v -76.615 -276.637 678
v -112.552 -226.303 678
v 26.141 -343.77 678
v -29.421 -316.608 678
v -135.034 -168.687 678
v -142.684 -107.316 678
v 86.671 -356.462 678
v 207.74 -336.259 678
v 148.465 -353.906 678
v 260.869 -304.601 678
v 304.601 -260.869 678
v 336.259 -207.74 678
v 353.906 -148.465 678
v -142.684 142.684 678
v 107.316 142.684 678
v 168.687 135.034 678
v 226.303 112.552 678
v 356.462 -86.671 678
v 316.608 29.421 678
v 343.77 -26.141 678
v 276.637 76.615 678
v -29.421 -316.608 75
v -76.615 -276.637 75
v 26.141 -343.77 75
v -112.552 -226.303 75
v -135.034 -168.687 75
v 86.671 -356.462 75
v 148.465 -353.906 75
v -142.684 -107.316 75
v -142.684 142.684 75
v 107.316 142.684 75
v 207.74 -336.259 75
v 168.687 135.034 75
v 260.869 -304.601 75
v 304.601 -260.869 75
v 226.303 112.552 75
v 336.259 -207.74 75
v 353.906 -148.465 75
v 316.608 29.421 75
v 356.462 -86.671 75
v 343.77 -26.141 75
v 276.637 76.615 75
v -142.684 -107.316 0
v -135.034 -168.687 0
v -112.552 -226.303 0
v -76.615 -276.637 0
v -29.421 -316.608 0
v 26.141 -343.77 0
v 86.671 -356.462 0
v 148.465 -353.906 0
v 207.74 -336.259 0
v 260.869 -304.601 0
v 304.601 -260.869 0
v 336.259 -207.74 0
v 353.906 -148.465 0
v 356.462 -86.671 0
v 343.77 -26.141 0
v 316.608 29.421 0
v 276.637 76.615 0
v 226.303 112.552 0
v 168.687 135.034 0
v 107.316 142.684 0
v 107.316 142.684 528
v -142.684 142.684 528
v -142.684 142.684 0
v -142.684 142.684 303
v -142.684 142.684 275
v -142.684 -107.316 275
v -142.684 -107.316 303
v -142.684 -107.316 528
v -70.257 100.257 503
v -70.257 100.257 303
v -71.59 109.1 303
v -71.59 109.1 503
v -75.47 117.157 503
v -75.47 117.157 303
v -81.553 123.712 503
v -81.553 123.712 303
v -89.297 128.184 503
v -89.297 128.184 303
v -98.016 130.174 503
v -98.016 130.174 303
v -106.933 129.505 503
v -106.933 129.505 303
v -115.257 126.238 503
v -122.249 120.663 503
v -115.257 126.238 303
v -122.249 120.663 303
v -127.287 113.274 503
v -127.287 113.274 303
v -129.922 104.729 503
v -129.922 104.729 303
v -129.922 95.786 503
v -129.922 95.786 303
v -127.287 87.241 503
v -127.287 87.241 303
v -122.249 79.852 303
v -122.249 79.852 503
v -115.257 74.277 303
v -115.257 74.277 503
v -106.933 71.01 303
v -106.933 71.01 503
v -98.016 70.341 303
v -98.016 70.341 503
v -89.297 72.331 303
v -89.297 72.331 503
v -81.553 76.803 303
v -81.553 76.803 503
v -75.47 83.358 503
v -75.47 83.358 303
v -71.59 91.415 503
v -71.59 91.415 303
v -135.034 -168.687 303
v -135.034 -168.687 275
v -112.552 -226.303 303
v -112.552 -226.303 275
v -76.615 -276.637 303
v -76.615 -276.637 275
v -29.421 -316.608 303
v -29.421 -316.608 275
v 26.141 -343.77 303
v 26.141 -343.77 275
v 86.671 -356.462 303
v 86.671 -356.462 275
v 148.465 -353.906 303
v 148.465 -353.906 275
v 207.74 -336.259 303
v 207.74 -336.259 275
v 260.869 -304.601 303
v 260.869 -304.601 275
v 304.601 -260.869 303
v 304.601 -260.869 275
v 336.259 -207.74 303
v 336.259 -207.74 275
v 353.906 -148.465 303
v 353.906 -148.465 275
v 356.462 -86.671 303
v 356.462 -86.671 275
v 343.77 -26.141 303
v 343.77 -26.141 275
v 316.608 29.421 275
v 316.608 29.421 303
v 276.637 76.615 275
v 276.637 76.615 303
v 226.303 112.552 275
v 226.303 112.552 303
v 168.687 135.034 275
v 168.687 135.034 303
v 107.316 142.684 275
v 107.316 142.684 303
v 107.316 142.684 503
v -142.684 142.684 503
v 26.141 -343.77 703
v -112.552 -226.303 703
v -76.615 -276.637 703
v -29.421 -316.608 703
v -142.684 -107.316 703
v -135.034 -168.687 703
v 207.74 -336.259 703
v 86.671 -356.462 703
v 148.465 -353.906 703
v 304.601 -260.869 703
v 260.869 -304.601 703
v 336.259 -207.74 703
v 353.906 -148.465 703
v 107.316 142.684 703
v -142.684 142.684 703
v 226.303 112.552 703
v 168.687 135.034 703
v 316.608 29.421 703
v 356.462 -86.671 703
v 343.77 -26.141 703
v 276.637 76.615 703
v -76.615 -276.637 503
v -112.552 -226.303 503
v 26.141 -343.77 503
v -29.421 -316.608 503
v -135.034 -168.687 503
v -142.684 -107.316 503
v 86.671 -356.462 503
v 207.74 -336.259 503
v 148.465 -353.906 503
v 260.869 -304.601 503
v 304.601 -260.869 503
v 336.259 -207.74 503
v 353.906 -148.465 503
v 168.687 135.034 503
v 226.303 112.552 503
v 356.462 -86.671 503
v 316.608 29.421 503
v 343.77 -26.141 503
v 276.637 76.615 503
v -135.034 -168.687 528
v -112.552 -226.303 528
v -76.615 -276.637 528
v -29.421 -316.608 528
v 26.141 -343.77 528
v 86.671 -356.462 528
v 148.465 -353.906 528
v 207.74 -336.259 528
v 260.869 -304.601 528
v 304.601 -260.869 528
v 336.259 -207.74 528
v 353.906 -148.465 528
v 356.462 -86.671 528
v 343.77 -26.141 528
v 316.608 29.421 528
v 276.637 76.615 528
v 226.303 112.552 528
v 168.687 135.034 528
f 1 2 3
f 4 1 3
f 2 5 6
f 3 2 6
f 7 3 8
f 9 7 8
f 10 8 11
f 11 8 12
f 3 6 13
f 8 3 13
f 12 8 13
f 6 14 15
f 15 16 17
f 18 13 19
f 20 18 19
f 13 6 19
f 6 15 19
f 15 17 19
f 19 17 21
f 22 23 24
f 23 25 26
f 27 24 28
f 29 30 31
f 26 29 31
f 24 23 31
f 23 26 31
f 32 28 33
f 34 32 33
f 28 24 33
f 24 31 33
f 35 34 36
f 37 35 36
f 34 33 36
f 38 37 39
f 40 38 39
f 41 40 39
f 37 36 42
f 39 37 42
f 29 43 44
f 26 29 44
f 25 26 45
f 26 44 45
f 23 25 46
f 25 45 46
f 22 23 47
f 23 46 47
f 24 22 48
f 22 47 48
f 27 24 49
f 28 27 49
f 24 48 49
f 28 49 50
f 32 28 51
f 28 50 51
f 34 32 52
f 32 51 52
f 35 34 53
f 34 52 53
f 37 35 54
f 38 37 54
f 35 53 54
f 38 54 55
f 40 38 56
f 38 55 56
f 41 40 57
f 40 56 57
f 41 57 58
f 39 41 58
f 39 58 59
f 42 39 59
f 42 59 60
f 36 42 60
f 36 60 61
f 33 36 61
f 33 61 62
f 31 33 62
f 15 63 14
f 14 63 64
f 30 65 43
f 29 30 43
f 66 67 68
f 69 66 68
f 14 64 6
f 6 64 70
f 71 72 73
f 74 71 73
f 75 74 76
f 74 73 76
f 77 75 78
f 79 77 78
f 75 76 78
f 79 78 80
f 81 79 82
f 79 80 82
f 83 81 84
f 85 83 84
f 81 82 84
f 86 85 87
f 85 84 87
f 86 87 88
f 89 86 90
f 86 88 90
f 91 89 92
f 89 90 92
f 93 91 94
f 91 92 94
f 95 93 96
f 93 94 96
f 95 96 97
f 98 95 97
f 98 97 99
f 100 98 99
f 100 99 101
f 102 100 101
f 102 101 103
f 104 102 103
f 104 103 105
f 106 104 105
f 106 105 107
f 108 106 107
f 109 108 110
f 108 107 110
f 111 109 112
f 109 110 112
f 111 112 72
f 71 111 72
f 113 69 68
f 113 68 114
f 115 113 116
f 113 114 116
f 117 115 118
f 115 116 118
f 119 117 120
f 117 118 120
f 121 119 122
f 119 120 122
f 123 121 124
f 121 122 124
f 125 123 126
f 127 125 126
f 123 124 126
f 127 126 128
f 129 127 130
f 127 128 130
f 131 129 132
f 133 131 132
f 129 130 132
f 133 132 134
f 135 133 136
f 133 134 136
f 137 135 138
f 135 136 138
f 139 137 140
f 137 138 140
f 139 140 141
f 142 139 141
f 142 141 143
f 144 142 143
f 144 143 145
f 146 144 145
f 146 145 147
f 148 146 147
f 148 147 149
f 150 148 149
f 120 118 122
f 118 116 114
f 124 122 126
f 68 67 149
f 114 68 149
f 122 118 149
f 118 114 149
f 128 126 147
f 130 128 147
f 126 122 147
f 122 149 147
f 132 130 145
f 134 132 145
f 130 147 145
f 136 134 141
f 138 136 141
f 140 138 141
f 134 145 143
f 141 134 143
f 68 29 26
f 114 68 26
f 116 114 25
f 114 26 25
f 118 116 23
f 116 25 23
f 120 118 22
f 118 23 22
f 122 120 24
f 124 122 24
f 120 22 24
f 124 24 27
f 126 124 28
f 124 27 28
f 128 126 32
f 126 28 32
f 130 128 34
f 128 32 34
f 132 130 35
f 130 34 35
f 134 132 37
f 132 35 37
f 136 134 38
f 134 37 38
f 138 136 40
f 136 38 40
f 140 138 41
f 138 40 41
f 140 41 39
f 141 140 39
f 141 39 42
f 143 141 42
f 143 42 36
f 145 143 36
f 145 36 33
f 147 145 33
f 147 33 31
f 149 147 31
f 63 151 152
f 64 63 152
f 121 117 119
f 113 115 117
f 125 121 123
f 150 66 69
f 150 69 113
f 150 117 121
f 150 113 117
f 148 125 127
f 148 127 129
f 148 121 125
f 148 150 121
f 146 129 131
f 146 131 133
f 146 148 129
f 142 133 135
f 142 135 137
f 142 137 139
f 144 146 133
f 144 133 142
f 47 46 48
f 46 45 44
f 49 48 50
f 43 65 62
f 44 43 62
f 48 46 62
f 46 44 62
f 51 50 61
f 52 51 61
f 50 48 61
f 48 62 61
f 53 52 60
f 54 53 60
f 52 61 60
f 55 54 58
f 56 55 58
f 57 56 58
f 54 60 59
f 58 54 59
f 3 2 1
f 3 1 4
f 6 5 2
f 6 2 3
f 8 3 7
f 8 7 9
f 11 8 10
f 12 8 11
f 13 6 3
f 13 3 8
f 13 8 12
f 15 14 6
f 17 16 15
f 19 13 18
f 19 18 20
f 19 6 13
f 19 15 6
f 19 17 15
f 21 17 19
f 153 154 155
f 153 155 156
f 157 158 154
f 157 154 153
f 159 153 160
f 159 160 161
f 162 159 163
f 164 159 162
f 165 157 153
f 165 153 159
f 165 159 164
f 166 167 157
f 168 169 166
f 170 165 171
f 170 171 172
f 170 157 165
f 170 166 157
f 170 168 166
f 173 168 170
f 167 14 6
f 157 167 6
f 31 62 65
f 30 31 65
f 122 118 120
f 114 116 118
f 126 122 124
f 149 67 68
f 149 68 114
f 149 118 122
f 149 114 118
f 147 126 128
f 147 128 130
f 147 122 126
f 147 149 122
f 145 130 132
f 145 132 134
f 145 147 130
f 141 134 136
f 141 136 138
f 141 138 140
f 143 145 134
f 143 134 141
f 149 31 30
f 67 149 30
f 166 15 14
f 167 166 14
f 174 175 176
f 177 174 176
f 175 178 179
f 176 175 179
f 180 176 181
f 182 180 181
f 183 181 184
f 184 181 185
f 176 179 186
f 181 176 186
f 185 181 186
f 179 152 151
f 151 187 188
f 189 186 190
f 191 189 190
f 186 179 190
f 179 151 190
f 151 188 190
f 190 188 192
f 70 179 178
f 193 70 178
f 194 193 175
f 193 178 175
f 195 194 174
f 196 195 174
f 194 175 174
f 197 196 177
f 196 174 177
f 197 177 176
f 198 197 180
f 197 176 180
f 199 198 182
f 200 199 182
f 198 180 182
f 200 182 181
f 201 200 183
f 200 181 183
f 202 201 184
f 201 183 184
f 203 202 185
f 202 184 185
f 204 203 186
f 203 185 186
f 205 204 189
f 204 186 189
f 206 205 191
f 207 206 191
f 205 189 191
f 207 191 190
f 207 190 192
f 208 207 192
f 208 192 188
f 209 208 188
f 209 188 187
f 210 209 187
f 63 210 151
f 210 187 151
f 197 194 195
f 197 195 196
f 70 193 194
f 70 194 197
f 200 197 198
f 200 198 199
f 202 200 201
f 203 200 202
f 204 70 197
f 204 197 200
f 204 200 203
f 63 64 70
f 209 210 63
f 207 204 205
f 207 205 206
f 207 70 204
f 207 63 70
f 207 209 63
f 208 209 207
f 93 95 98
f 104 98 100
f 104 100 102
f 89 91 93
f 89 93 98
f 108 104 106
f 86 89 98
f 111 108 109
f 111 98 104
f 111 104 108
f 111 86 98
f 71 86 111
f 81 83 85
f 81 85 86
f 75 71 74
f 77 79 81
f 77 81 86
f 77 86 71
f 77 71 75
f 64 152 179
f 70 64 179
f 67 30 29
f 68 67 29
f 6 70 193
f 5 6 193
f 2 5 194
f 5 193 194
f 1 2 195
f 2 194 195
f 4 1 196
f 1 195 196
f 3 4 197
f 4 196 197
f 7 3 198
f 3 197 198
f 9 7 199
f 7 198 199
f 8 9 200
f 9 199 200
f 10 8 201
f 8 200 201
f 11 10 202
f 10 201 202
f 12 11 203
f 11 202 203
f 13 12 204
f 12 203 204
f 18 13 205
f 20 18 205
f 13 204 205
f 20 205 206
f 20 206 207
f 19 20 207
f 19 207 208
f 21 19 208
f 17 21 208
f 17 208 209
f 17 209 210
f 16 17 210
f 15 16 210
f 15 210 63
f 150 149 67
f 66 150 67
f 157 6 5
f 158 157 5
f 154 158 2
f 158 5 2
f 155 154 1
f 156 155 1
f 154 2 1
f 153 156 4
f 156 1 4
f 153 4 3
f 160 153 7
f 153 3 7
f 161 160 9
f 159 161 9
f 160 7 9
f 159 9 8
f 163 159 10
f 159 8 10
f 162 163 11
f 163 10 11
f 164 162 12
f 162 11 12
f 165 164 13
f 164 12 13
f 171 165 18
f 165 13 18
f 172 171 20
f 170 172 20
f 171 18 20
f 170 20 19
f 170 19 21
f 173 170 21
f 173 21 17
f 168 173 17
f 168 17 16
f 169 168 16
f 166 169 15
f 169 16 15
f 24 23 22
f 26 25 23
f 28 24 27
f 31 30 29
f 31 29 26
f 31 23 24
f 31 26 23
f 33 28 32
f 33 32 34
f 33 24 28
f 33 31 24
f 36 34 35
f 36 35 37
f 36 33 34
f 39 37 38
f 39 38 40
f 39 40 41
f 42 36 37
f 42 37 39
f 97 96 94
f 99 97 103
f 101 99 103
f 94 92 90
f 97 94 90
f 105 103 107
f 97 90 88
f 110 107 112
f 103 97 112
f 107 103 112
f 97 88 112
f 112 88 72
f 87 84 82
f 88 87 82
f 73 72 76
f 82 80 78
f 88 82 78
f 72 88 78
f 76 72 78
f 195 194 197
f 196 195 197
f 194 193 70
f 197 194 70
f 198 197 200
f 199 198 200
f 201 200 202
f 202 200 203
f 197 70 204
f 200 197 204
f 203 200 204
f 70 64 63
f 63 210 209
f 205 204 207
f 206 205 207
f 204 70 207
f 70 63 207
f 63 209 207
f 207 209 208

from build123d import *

# Parameters (mm, degrees)
F1_DEPTH = 75
F2_DEPTH = 200
F3_DEPTH = 3
F4_DEPTH = 25
F5_START = 200
F5_DEPTH = 25
F6_DEPTH = 150
F7_DEPTH = 25
F8_R     = 30
F9_DEPTH = 200


with BuildPart() as f1:
    # F0 (on Top) → F1 (new body)
    with BuildSketch(Plane.XY):
        with BuildLine():
            Line((-142.6838825658, 142.6838825658), (-142.6838825658, -107.3161174342))
            ThreePointArc((-142.6838825658, -107.3161174342), (284.0928127309, -284.0928127309), (107.3161174342, 142.6838825658))
            Line((107.3161174342, 142.6838825658), (-142.6838825658, 142.6838825658))
        make_face()
    extrude(amount=F1_DEPTH)


with BuildPart() as f2:
    # F2 (new): a face of the model
    f2_faces = [f1.part.faces().sort_by_distance(p)[0] for p in [
        (94.9012628159, -94.9012628159, 75),
    ]]
    extrude(f2_faces, amount=F2_DEPTH)


with BuildPart() as f3:
    # F3 (new): a face of the model
    f3_faces = [f2.part.faces().sort_by_distance(p)[0] for p in [
        (94.9012628159, -94.9012628159, 275),
    ]]
    extrude(f3_faces, amount=F3_DEPTH)

    # F4 (add): a face of the model
    f4_faces = [f3.faces().sort_by_distance(p)[0] for p in [
        (94.9012628159, -94.9012628159, 278),
    ]]
    extrude(f4_faces, amount=F4_DEPTH)


with BuildPart() as f5:
    # F4_face (on face) → F5 (new body)
    with BuildSketch(Plane(origin=(94.9012628159, -94.9012628159, 303), x_dir=(1, 0, 0), z_dir=(0, 0, 1)).offset(F5_START)):
        with BuildLine():
            Line((12.4148546184, 237.5851453816), (-237.5851453816, 237.5851453816))
            Line((-237.5851453816, 237.5851453816), (-237.5851453816, -12.4148546184))
            ThreePointArc((-237.5851453816, -12.4148546184), (189.191549915, -189.191549915), (12.4148546184, 237.5851453816))
        make_face()
    extrude(amount=F5_DEPTH)


with BuildPart() as f6:
    # F6 (new): a face of the model
    f6_faces = [f5.part.faces().sort_by_distance(p)[0] for p in [
        (94.9012628159, -94.9012628159, 528),
    ]]
    extrude(f6_faces, amount=F6_DEPTH)


with BuildPart() as f7:
    # F7 (new): a face of the model
    f7_faces = [f6.part.faces().sort_by_distance(p)[0] for p in [
        (94.9012628159, -94.9012628159, 678),
    ]]
    extrude(f7_faces, amount=F7_DEPTH)


with BuildPart() as f9:
    # F8 (on face) → F9 (new body, through all)
    with BuildSketch(Plane.XY.offset(303)):
        with Locations((-100.2574756946, 100.2574756946)):
            Circle(F8_R)
    extrude(amount=F9_DEPTH)


solid = Compound([f1.part, f2.part, f3.part, f5.part, f6.part, f7.part, f9.part])
